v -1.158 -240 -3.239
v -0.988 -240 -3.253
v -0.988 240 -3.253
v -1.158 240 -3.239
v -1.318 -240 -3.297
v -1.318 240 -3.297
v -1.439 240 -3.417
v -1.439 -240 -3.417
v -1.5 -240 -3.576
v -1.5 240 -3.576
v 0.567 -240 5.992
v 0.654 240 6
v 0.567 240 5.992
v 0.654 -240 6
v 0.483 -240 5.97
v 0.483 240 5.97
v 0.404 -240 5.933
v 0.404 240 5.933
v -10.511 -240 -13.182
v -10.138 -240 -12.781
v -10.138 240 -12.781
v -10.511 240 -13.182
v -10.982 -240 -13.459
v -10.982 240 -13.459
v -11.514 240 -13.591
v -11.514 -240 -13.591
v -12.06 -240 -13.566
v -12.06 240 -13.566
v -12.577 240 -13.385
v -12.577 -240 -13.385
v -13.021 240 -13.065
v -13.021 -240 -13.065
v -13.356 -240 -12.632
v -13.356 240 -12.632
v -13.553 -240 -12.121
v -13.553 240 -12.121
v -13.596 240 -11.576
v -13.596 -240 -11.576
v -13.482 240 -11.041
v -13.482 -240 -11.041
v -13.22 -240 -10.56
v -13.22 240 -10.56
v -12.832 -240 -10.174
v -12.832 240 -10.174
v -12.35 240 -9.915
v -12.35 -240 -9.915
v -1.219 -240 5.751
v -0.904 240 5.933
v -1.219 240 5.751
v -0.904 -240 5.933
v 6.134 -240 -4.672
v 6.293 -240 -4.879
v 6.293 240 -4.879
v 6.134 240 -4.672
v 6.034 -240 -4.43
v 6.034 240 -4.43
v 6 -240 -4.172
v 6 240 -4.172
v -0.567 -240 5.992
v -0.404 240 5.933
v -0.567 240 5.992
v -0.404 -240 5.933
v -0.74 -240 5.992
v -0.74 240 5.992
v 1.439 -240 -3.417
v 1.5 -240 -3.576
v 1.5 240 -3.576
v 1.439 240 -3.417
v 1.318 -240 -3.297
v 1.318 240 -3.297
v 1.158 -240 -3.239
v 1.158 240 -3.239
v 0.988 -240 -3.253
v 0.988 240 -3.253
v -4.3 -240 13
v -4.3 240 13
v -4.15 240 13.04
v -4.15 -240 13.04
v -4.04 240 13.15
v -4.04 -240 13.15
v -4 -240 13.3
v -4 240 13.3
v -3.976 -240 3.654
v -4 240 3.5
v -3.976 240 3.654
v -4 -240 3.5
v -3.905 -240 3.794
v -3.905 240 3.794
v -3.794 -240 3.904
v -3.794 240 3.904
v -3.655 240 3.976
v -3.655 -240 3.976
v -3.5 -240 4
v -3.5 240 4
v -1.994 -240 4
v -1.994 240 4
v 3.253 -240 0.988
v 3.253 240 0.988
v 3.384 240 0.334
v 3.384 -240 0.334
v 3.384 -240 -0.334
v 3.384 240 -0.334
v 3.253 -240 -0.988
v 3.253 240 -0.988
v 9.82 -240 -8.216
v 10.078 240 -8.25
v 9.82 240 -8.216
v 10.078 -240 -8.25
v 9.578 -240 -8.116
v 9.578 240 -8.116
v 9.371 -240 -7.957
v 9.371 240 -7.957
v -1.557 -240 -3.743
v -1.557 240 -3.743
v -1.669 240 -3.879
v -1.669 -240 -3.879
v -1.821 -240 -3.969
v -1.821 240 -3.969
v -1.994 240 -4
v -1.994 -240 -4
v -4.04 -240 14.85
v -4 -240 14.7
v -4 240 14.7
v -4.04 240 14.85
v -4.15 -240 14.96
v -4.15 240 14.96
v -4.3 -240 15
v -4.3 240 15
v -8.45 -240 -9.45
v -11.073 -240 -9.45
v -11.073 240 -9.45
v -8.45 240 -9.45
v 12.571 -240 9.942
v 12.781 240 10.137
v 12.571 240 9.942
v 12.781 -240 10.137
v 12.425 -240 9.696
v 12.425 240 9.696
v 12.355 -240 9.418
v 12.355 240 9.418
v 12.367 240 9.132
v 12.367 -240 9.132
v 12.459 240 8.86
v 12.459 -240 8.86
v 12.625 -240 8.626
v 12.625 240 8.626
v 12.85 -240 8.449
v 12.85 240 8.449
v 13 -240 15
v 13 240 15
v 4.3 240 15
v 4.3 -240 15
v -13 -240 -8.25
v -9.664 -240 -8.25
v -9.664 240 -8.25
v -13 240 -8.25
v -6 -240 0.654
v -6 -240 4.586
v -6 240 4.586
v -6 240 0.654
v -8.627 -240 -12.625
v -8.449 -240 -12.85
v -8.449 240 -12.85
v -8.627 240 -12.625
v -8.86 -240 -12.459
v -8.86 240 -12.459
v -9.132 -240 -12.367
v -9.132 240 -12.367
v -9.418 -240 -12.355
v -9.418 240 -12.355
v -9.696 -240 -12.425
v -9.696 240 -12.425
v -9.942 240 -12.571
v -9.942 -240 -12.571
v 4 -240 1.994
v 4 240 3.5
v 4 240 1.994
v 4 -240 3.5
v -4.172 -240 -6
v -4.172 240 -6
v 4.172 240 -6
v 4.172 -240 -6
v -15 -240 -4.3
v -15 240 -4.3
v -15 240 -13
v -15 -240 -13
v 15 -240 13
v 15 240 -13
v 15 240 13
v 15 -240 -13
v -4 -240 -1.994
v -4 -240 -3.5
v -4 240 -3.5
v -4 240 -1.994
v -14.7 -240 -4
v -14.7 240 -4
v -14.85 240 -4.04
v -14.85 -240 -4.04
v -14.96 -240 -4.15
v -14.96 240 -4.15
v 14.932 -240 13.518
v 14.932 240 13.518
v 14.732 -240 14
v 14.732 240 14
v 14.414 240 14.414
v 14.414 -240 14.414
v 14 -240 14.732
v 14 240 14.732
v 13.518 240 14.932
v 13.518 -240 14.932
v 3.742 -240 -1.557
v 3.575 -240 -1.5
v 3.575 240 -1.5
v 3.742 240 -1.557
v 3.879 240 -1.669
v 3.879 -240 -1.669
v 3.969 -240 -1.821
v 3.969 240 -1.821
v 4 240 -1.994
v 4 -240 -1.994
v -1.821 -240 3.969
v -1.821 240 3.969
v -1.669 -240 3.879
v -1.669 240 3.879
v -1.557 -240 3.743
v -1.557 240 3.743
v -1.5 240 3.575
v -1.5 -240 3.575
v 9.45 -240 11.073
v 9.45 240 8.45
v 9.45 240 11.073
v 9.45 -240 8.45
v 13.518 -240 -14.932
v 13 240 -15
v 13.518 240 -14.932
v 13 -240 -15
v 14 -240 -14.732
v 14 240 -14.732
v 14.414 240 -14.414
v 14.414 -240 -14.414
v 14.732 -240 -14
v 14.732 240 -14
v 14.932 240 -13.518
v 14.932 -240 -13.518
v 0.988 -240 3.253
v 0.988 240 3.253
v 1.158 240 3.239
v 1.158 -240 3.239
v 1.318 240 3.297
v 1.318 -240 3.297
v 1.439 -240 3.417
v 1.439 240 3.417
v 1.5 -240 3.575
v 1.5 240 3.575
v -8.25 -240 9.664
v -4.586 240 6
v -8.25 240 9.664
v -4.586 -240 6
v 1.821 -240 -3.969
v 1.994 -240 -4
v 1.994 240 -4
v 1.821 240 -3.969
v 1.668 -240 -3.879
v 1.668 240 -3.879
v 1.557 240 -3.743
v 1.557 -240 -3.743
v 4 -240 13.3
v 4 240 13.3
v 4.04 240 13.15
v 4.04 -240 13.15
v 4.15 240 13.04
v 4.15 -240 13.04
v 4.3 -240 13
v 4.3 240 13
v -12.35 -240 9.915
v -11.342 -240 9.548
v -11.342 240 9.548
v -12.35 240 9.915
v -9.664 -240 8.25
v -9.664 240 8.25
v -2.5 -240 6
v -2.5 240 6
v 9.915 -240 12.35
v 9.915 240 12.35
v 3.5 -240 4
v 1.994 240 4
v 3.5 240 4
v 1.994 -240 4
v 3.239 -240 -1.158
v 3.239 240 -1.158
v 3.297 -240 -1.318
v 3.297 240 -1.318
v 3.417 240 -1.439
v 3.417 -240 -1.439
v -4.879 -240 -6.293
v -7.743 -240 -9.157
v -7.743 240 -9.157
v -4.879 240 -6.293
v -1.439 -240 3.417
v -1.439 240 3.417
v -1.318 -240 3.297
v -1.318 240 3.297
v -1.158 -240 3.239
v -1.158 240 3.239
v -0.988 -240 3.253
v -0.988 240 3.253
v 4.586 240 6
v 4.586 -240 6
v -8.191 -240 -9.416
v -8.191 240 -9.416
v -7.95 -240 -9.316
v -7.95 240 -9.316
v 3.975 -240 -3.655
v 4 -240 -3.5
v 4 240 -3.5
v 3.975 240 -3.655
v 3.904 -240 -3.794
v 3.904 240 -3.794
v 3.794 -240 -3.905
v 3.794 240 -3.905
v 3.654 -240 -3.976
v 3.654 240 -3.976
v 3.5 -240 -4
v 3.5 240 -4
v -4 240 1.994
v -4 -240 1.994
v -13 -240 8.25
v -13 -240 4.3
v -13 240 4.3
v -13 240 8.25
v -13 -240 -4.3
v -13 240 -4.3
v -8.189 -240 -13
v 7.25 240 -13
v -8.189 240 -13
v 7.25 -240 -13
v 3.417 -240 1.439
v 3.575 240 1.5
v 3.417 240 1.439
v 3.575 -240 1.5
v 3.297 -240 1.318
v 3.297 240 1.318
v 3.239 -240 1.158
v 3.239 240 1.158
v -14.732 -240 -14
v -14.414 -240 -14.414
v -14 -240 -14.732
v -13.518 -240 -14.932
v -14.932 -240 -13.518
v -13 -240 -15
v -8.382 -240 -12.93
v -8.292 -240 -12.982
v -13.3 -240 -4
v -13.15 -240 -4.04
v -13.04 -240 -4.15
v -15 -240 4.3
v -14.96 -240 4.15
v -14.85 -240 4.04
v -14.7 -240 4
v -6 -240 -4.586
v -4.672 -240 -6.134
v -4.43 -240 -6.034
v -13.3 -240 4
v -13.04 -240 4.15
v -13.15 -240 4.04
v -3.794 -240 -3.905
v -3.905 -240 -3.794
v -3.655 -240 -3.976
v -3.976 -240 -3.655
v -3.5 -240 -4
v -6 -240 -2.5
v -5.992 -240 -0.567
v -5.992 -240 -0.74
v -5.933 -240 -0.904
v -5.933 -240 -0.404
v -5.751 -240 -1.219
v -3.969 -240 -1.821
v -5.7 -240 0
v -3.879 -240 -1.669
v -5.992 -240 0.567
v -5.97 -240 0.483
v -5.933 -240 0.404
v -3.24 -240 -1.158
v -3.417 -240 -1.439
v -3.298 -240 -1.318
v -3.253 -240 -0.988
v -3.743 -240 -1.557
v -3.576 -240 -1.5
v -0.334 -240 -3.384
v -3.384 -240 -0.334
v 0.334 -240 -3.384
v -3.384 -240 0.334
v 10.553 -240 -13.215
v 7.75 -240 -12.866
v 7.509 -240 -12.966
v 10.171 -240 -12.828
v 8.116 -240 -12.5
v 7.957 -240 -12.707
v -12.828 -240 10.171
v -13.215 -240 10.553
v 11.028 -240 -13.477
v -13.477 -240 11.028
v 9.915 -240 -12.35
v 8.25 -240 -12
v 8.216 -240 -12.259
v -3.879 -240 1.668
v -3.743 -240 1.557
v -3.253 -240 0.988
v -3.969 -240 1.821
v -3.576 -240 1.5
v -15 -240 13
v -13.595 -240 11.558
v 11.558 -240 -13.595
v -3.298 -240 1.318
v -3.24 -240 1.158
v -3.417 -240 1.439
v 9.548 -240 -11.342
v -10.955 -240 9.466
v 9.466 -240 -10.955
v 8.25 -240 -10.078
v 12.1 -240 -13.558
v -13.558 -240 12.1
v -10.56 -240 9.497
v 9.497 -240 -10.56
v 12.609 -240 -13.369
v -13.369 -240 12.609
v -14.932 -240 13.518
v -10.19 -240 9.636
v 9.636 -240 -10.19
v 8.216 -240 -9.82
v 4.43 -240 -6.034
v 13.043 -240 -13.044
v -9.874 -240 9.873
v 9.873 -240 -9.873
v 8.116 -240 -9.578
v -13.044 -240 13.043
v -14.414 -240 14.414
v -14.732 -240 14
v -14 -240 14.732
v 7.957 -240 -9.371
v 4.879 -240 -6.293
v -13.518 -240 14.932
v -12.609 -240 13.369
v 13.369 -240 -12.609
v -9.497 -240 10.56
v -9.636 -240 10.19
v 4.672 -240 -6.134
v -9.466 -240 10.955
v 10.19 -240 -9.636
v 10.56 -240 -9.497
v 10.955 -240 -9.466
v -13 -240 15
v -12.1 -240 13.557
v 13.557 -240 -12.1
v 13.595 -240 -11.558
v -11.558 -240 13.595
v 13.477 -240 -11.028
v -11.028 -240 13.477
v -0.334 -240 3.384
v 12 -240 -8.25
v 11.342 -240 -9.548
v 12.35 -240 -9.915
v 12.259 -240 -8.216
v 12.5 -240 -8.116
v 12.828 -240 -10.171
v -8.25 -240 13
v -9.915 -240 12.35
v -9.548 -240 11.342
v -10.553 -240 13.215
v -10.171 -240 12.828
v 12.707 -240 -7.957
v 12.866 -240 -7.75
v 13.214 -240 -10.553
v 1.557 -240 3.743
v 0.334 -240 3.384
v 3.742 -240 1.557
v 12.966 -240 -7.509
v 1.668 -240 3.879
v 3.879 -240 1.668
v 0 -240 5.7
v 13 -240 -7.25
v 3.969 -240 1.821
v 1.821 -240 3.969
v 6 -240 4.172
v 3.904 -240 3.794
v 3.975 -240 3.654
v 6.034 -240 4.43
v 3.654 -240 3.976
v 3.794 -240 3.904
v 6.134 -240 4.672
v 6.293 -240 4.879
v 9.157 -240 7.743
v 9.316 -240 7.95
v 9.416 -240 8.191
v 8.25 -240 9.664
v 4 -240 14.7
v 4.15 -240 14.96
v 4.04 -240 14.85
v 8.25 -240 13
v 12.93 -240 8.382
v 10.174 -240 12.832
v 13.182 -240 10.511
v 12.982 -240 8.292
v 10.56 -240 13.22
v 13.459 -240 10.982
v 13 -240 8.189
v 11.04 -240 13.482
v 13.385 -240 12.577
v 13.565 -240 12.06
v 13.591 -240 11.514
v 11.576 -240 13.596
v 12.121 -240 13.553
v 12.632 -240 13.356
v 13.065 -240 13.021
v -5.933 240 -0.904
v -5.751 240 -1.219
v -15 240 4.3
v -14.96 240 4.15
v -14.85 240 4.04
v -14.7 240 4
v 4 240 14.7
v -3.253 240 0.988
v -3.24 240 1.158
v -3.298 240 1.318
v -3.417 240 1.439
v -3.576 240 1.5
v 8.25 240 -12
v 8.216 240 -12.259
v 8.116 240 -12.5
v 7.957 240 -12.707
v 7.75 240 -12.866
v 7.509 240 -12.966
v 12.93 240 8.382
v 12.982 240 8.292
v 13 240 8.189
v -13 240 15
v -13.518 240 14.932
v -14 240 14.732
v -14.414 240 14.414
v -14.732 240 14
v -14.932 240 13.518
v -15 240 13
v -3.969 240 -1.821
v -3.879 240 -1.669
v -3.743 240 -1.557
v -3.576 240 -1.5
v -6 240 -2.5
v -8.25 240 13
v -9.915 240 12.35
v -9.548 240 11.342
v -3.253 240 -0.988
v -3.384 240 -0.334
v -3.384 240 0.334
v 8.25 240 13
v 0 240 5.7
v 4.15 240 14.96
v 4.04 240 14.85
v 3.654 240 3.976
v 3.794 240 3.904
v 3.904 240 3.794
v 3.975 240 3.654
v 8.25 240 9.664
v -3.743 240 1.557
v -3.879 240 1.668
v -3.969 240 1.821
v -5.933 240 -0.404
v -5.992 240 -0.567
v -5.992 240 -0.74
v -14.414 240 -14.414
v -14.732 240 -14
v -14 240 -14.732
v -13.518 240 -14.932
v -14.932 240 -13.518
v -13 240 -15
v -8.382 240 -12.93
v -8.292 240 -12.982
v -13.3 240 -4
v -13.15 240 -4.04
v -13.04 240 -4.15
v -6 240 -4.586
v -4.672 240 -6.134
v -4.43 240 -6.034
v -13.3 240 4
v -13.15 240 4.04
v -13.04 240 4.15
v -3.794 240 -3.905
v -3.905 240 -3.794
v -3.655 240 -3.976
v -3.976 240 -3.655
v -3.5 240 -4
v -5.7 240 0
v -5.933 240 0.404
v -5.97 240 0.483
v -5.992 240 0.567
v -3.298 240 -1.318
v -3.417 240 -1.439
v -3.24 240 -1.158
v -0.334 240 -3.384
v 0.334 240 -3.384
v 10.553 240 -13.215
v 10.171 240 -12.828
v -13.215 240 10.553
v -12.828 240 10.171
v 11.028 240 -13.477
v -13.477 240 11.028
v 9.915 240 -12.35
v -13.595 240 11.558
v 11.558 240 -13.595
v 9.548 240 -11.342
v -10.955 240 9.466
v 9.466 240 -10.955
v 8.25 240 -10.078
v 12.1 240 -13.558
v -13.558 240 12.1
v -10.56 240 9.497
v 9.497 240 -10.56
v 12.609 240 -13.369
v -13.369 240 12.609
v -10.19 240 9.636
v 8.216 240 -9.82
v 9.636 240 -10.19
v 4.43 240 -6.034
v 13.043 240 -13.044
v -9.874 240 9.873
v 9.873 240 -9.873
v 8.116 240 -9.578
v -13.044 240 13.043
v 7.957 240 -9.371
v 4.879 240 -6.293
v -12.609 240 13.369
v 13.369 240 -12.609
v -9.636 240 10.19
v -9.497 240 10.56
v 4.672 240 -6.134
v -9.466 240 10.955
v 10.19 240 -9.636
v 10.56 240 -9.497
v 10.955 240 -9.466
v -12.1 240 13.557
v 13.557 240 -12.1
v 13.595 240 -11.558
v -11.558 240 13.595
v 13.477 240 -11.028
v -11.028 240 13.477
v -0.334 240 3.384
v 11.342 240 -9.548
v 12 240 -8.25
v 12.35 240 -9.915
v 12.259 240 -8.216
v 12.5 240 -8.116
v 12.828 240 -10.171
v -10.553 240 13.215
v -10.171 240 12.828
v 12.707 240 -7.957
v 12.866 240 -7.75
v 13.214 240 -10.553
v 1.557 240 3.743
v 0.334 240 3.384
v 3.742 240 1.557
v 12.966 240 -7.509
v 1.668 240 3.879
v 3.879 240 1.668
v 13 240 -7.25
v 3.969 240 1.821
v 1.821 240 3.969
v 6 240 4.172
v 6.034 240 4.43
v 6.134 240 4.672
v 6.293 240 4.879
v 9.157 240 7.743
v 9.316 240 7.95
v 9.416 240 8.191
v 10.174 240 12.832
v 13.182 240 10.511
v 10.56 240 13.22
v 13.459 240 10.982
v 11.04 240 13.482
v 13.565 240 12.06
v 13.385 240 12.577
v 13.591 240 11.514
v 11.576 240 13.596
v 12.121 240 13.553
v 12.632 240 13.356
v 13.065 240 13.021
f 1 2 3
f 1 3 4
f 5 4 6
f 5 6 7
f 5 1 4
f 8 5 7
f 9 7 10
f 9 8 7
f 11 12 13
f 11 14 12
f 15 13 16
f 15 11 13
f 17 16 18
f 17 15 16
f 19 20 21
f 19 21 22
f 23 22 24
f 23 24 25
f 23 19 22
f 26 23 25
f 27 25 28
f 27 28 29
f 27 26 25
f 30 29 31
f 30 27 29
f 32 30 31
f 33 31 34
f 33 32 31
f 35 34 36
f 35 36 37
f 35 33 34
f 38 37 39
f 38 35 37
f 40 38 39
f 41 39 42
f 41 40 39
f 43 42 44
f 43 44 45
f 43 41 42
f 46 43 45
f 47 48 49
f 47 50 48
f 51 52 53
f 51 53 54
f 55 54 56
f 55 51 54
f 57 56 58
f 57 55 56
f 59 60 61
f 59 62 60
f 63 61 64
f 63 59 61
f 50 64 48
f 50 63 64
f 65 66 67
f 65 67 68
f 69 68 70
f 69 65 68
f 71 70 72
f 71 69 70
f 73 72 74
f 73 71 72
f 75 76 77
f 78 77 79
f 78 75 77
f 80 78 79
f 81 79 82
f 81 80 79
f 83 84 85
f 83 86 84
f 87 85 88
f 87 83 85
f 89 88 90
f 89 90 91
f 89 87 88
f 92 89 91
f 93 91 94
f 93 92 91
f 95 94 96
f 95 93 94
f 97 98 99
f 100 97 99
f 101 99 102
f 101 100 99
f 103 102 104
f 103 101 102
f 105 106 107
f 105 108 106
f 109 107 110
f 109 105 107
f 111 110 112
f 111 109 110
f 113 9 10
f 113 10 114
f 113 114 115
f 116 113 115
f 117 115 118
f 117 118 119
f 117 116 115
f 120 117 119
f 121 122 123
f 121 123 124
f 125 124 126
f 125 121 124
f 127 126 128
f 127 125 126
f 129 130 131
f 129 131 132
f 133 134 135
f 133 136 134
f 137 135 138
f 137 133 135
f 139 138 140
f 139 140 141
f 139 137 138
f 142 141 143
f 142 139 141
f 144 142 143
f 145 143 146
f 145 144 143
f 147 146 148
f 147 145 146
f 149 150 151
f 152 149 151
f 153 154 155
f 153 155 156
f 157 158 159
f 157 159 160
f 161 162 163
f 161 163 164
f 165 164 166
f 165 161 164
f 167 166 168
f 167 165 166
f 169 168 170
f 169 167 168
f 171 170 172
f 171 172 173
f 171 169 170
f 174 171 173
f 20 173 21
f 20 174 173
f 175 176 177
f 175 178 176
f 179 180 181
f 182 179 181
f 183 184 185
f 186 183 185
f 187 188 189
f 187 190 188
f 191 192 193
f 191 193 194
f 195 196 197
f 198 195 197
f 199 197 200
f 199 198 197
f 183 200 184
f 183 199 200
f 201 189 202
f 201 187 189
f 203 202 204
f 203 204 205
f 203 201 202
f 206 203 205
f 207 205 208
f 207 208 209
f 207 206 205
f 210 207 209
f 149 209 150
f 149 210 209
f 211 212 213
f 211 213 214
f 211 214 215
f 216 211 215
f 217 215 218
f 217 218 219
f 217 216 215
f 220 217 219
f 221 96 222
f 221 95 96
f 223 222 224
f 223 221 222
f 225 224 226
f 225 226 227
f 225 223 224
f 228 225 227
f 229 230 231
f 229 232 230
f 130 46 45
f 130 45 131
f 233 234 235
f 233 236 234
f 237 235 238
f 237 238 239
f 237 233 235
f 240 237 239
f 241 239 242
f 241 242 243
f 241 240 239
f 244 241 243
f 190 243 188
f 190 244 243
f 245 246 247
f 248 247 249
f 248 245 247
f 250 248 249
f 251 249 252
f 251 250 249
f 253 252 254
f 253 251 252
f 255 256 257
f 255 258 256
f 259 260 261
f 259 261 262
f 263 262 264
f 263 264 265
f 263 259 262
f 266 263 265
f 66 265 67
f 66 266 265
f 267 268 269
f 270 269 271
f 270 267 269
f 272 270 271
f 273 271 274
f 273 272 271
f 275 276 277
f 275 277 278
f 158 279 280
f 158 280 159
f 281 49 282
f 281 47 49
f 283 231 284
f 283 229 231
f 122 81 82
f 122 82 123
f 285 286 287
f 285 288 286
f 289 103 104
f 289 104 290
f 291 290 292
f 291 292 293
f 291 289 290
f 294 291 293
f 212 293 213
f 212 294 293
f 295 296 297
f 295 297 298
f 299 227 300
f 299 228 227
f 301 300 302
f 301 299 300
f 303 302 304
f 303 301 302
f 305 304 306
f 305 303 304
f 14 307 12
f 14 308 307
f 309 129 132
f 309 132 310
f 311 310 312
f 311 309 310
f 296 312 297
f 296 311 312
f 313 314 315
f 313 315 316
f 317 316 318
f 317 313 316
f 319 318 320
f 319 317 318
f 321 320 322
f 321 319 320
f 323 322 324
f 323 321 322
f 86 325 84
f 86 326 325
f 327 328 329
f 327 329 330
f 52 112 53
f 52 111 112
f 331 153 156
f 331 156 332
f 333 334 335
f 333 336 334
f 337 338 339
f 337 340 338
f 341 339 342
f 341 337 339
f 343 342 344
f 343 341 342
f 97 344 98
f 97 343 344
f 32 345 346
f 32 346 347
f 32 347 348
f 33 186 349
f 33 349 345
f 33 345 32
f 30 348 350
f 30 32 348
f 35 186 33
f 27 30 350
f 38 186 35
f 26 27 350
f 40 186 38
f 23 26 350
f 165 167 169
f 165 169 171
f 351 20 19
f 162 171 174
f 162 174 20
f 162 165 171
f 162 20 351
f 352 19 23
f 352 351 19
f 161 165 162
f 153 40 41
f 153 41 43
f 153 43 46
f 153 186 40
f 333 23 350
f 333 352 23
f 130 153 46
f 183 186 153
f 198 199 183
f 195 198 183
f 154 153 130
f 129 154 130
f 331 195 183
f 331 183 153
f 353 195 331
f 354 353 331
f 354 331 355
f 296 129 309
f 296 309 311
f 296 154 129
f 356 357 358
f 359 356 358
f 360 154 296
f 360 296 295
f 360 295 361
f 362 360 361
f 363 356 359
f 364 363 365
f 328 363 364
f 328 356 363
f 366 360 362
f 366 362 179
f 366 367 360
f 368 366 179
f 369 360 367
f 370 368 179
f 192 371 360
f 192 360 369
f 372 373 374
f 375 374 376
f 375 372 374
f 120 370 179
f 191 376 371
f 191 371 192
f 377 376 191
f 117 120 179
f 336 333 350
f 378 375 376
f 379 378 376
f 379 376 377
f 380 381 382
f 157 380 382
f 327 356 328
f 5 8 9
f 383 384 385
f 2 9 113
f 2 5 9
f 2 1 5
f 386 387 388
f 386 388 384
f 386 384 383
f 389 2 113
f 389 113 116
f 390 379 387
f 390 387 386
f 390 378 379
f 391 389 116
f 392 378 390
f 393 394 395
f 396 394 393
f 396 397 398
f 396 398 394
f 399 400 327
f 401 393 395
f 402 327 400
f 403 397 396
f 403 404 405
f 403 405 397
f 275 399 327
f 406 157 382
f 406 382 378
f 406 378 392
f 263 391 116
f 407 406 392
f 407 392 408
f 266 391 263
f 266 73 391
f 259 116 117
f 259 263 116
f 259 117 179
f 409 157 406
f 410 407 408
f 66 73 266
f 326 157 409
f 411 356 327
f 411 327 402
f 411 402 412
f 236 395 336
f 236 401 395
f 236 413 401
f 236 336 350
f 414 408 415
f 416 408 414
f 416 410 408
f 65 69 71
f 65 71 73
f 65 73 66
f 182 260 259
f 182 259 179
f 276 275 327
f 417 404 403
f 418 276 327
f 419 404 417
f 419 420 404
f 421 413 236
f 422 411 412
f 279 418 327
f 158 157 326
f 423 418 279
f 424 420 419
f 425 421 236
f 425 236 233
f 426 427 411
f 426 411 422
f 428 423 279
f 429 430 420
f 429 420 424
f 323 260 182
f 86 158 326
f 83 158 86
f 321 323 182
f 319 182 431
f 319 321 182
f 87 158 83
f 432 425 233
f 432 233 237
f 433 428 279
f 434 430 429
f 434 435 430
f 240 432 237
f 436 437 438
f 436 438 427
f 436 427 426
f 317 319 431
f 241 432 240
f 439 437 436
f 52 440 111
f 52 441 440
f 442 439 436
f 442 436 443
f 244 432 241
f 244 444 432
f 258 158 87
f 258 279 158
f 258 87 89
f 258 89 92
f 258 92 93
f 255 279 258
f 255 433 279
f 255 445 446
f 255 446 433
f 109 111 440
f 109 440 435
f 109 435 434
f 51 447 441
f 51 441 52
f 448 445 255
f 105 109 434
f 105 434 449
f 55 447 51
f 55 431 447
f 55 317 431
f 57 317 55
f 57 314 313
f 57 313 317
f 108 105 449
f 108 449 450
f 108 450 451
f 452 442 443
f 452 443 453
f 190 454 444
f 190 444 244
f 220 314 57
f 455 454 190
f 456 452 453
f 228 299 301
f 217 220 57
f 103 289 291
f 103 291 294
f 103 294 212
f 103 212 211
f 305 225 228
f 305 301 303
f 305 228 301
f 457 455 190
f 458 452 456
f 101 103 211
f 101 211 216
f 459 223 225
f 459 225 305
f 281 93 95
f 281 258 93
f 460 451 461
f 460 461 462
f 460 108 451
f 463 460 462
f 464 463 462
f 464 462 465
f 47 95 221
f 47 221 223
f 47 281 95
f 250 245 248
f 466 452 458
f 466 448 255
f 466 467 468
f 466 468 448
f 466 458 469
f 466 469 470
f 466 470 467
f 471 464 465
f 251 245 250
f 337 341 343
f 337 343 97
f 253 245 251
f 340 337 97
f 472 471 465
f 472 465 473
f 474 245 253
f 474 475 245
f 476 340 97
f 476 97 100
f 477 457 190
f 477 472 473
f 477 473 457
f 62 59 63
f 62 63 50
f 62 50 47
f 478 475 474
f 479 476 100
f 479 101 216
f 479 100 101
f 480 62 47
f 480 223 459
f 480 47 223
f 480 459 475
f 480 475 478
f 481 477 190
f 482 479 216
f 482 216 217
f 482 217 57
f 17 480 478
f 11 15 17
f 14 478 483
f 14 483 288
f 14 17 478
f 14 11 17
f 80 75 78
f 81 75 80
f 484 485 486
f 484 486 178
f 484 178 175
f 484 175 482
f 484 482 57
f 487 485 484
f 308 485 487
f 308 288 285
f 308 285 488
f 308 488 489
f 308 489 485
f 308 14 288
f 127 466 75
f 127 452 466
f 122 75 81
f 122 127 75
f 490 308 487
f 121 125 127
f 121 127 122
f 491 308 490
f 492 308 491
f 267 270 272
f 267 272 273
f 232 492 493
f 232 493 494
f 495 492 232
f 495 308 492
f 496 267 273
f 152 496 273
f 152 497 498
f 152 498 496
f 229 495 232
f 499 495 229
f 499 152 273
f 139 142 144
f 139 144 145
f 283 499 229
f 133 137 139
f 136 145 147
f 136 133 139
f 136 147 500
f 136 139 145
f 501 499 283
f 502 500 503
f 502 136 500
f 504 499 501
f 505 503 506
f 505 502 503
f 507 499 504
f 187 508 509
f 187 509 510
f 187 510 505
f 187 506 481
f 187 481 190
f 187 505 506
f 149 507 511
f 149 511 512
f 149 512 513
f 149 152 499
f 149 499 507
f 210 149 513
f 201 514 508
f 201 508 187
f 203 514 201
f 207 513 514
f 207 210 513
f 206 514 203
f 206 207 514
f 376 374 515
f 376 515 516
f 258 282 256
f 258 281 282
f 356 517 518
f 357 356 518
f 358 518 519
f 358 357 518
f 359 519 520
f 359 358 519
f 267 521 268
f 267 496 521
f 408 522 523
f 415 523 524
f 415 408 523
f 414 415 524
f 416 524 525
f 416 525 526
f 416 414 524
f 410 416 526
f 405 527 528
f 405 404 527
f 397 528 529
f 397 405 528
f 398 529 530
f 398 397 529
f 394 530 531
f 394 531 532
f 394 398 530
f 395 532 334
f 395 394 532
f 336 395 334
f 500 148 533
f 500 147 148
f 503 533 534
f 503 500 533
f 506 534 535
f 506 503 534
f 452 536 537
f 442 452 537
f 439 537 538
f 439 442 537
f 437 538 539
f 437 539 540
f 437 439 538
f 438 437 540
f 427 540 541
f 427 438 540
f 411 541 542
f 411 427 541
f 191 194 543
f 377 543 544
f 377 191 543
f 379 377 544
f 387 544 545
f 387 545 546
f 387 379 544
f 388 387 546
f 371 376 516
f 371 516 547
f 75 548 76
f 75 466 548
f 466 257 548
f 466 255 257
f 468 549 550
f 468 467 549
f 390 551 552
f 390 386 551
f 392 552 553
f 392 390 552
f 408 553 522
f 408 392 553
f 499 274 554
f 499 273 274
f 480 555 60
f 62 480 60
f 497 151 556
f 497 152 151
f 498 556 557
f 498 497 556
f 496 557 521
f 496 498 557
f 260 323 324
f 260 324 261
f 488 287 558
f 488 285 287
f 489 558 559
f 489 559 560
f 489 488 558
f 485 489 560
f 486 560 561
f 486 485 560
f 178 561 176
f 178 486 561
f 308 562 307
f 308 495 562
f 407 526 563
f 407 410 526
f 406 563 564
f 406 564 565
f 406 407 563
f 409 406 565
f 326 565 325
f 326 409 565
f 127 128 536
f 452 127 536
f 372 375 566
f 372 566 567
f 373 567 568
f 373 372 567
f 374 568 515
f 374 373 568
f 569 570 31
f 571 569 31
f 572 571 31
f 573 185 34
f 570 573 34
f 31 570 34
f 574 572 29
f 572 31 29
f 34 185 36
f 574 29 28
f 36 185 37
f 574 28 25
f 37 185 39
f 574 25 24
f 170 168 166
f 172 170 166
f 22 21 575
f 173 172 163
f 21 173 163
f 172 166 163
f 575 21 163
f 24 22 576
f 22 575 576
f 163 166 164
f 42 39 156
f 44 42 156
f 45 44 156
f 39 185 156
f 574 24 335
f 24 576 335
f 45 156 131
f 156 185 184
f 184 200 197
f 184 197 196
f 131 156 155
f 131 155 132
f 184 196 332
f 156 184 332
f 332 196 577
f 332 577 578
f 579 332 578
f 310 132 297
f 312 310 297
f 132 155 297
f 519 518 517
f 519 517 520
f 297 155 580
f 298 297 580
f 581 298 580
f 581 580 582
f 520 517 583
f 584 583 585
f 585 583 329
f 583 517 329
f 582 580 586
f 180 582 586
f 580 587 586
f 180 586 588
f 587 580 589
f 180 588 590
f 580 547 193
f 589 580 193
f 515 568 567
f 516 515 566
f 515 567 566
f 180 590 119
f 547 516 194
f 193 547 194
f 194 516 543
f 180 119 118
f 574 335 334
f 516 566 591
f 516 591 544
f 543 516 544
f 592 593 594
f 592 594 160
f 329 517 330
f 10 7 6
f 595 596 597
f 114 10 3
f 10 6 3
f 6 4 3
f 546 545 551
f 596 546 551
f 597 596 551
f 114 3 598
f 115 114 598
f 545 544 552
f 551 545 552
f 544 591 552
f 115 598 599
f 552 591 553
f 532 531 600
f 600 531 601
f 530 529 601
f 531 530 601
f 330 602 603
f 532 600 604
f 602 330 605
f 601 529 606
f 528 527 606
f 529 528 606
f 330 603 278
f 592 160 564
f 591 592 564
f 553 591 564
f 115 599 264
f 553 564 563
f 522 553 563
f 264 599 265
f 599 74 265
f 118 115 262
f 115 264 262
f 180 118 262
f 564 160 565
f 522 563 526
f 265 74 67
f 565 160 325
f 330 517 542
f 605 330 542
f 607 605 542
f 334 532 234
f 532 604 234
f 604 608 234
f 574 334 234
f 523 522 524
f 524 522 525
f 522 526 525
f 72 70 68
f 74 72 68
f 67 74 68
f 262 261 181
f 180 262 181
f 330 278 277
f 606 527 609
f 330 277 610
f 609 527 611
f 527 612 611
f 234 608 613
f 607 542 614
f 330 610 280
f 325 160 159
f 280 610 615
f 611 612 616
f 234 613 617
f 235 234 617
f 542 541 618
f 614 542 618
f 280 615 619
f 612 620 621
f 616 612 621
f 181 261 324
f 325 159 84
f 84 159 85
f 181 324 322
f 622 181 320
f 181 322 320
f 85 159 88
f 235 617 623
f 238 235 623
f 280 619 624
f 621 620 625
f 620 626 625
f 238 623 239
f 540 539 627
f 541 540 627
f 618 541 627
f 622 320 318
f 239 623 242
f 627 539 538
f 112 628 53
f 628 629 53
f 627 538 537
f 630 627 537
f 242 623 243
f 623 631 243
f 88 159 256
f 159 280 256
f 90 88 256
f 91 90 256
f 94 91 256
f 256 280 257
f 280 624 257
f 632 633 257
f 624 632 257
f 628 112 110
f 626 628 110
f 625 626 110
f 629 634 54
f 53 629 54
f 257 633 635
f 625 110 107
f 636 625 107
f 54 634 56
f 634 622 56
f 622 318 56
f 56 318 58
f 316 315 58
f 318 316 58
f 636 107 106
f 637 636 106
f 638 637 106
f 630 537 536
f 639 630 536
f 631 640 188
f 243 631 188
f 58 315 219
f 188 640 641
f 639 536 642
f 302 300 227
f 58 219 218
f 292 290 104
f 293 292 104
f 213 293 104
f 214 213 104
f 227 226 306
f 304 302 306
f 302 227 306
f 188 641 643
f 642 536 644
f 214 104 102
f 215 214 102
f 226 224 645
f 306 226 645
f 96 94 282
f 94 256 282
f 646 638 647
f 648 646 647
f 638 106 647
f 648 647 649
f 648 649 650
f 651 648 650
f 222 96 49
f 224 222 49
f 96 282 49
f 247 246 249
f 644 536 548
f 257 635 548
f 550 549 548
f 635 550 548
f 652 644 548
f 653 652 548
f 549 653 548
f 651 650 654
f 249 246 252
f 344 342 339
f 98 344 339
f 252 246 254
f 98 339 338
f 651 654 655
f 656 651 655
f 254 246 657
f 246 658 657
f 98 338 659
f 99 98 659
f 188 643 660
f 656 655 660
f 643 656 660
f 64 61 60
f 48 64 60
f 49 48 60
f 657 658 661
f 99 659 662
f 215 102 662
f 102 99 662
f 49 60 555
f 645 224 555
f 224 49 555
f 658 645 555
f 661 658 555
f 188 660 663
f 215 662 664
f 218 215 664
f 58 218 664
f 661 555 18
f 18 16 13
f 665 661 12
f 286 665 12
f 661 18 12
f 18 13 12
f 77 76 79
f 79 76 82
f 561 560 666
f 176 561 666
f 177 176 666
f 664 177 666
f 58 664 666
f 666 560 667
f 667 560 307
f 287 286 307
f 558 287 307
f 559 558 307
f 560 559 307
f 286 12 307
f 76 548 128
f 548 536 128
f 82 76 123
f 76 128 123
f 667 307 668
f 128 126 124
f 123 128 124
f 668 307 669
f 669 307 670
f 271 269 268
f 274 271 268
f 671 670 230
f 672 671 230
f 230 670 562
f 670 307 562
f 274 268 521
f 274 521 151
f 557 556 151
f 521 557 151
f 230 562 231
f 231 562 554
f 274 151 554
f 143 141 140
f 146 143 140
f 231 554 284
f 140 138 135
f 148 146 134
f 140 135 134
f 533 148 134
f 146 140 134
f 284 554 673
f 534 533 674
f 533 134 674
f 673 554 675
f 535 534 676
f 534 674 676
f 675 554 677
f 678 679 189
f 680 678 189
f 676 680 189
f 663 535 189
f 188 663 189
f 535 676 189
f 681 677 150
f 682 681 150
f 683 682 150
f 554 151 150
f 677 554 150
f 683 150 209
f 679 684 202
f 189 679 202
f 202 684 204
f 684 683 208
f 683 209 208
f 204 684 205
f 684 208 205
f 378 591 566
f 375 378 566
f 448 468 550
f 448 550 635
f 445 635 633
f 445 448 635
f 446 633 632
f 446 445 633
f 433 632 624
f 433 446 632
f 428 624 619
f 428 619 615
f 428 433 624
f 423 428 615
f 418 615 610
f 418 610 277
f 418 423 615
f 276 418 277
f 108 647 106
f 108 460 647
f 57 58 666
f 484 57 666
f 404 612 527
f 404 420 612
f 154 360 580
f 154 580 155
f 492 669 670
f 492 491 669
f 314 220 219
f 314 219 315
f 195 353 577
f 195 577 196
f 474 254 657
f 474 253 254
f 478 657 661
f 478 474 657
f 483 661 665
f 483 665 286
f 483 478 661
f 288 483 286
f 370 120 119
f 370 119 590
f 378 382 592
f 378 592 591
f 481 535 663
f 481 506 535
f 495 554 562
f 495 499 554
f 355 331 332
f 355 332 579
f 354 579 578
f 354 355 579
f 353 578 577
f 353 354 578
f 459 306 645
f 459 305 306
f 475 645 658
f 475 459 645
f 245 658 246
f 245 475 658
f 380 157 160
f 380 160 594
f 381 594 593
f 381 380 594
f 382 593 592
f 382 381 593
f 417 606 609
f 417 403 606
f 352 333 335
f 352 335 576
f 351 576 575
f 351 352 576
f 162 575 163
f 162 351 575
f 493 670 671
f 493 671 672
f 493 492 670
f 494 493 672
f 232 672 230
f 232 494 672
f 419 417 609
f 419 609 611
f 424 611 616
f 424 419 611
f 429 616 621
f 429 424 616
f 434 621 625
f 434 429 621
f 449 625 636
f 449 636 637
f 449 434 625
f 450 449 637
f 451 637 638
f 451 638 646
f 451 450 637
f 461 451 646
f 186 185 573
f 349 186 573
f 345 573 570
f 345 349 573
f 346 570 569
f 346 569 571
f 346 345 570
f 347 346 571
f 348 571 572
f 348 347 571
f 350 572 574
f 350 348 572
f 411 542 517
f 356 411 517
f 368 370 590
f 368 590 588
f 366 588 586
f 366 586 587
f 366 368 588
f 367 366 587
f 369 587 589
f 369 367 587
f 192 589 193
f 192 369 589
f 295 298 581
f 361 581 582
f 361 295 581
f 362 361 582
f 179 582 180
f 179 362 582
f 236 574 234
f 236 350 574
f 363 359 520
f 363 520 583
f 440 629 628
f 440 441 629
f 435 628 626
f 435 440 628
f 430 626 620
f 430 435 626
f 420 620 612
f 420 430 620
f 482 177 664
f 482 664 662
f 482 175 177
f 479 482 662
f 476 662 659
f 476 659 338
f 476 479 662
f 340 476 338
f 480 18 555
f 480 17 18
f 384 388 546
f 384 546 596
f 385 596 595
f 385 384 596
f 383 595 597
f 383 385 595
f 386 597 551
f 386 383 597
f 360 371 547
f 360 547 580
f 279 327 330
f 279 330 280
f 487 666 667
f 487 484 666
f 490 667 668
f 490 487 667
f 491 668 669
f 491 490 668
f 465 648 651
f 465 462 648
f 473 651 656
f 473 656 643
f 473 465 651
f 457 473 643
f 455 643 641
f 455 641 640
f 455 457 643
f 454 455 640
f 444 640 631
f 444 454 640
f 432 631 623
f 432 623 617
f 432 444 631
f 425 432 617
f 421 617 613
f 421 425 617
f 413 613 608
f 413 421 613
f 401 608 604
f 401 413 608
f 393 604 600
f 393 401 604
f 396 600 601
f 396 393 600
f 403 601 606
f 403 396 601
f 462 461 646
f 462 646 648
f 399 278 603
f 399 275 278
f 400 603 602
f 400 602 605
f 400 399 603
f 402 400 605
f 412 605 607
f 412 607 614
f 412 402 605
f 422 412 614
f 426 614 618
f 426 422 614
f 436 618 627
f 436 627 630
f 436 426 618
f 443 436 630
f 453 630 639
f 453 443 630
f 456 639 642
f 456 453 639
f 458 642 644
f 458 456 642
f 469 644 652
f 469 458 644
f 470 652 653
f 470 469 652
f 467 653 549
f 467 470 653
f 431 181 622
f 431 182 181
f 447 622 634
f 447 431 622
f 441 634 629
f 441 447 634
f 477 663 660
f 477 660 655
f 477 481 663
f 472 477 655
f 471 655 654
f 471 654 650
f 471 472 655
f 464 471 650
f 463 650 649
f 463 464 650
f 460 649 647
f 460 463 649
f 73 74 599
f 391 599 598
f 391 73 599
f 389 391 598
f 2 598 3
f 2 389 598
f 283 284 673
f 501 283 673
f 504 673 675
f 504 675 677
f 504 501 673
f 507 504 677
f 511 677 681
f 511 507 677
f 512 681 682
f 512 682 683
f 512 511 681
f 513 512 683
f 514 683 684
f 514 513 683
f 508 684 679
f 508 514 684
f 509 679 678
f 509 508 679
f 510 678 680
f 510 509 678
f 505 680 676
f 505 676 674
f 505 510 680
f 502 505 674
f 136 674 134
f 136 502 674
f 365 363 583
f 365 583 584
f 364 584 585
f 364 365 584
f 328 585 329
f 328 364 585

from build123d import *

# Parameters (mm, degrees)
F2_DEPTH = 240


# Not quite as in the source:
# - ends of sketch curves that miss each other by under 0.0002 mm in the source are joined


with BuildPart() as f2:
    # F1 (on Front) → F2 (new body, symmetric)
    with BuildSketch(Plane.XZ):
        with BuildLine():
            Line((-8.250056, 12.999986), (-4.300056, 12.999986))
            ThreePointArc((-4.300056, 12.999986), (-4.0879239656, 13.0878539656), (-4.000056, 13.299986))
            Line((-4.000056, 13.299986), (-4.000056, 14.699986))
            ThreePointArc((-4.000056, 14.699986), (-4.0879239656, 14.9121180344), (-4.300056, 14.999986))
            Line((-4.300056, 14.999986), (-13.000056, 14.999986))
            ThreePointArc((-13.000056, 14.999986), (-14.4142695624, 14.4141995624), (-15.000056, 12.999986))
            Line((-15.000056, 12.999986), (-15.000056, 4.299986))
            ThreePointArc((-15.000056, 4.299986), (-14.9121880344, 4.0878539656), (-14.700056, 3.999986))
            Line((-14.700056, 3.999986), (-13.300056, 3.999986))
            ThreePointArc((-13.300056, 3.999986), (-13.0879239656, 4.0878539656), (-13.000056, 4.299986))
            Line((-13.000056, 4.299986), (-13.000056, 8.249986))
            Line((-13.000056, 8.249986), (-9.66427, 8.249986))
            Line((-9.66427, 8.249986), (-6.000056, 4.585772))
            Line((-6.000056, 4.585772), (-6.000056, 0.653576))
            ThreePointArc((-6.000056, 0.653576), (-5.9830189324, 0.5241665494), (-5.9330687764, 0.4035761291))
            Line((-5.9330687764, 0.4035761291), (-5.700056, -1.4e-05))
            Line((-5.700056, -1.4e-05), (-5.933069, -0.403604))
            ThreePointArc((-5.933069, -0.403604), (-6.000056, -0.653604), (-5.9330687764, -0.9036038709))
            Line((-5.9330687764, -0.9036038709), (-5.751033, -1.2189))
            Line((-5.751033, -1.2189), (-6.000056, -2.500014))
            Line((-6.000056, -2.500014), (-6.000056, -4.5858))
            Line((-6.000056, -4.5858), (-9.66427, -8.250014))
            Line((-9.66427, -8.250014), (-13.000056, -8.250014))
            Line((-13.000056, -8.250014), (-13.000056, -4.300014))
            ThreePointArc((-13.000056, -4.300014), (-13.0879239656, -4.0878819656), (-13.300056, -4.000014))
            Line((-13.300056, -4.000014), (-14.700056, -4.000014))
            ThreePointArc((-14.700056, -4.000014), (-14.9121880344, -4.0878819656), (-15.000056, -4.300014))
            Line((-15.000056, -4.300014), (-15.000056, -13.000014))
            ThreePointArc((-15.000056, -13.000014), (-14.4142695624, -14.4142275624), (-13.000056, -15.000014))
            Line((-13.000056, -15.000014), (12.999944, -15.000014))
            ThreePointArc((12.999944, -15.000014), (14.4141575624, -14.4142275624), (14.999944, -13.000014))
            Line((14.999944, -13.000014), (14.999944, 12.999986))
            ThreePointArc((14.999944, 12.999986), (14.4141575624, 14.4141995624), (12.999944, 14.999986))
            Line((12.999944, 14.999986), (4.299944, 14.999986))
            ThreePointArc((4.299944, 14.999986), (4.0878119656, 14.9121180344), (3.999944, 14.699986))
            Line((3.999944, 14.699986), (3.999944, 13.299986))
            ThreePointArc((3.999944, 13.299986), (4.0878119656, 13.0878539656), (4.299944, 12.999986))
            Line((4.299944, 12.999986), (8.249944, 12.999986))
            Line((8.249944, 12.999986), (8.249944, 9.6642))
            Line((8.249944, 9.6642), (4.58573, 5.999986))
            Line((4.58573, 5.999986), (0.653534, 5.999986))
            ThreePointArc((0.653534, 5.999986), (0.5241245494, 5.9829489324), (0.4035341291, 5.9329987764))
            Line((0.4035341291, 5.9329987764), (-5.6e-05, 5.699986))
            Line((-5.6e-05, 5.699986), (-0.403646, 5.932999))
            ThreePointArc((-0.403646, 5.932999), (-0.653646, 5.999986), (-0.9036458709, 5.9329987764))
            Line((-0.9036458709, 5.9329987764), (-1.218942, 5.750963))
            Line((-1.218942, 5.750963), (-2.500056, 5.999986))
            Line((-2.500056, 5.999986), (-4.585842, 5.999986))
            Line((-4.585842, 5.999986), (-8.250056, 9.6642))
            Line((-8.250056, 9.6642), (-8.250056, 12.999986))
        make_face()
        with BuildLine():
            ThreePointArc((-8.189375, -13.000014), (-8.339375082, -12.9598215738), (-8.4491827159, -12.8500138359))
            ThreePointArc((-8.4491827159, -12.8500138359), (-9.2743948384, -12.3508472042), (-10.1375690315, -12.7810479782))
            ThreePointArc((-10.1375690315, -12.7810479782), (-13.2041723505, -12.8608903949), (-12.3498940253, -9.9145979306))
            Line((-12.3498940253, -9.9145979306), (-11.07346, -9.450014))
            Line((-11.07346, -9.450014), (-8.450056, -9.450014))
            ThreePointArc((-8.450056, -9.450014), (-8.0673725676, -9.3738935325), (-7.7429492188, -9.1571207812))
            Line((-7.7429492188, -9.1571207812), (-4.878736, -6.292907))
            ThreePointArc((-4.878736, -6.292907), (-4.5543124324, -6.0761344675), (-4.171629, -6.000014))
            Line((-4.171629, -6.000014), (4.171517, -6.000014))
            ThreePointArc((4.171517, -6.000014), (4.5542004324, -6.0761344675), (4.8786237812, -6.2929072188))
            Line((4.8786237812, -6.2929072188), (7.957051, -9.371334))
            ThreePointArc((7.957051, -9.371334), (8.1738235325, -9.6957575676), (8.249944, -10.078441))
            Line((8.249944, -10.078441), (8.249944, -12.000014))
            ThreePointArc((8.249944, -12.000014), (7.9570507812, -12.7071207812), (7.249944, -13.000014))
            Line((7.249944, -13.000014), (-8.189375, -13.000014))
        make_face(mode=Mode.SUBTRACT)
        with BuildLine():
            ThreePointArc((9.5477956661, -11.3422641215), (9.8734155063, -9.8734855063), (11.3421941215, -9.5478656661))
            Line((11.3421941215, -9.5478656661), (12.349782, -9.914598))
            ThreePointArc((12.349782, -9.914598), (13.0434468843, -13.0435168843), (9.9145279306, -12.3498520253))
            Line((9.9145279306, -12.3498520253), (9.5477956661, -11.3422641215))
        make_face(mode=Mode.SUBTRACT)
        with BuildLine():
            ThreePointArc((-9.5479076661, 11.3422361215), (-9.8735275063, 9.8734575063), (-11.3423061215, 9.5478376661))
            Line((-11.3423061215, 9.5478376661), (-12.349894, 9.91457))
            ThreePointArc((-12.349894, 9.91457), (-13.0435588843, 13.0434888843), (-9.9146399306, 12.3498240253))
            Line((-9.9146399306, 12.3498240253), (-9.5479076661, 11.3422361215))
        make_face(mode=Mode.SUBTRACT)
        with BuildLine():
            ThreePointArc((3.2531309855, 0.9883049956), (3.399944, -1.4e-05), (3.2531309855, -0.9883329956))
            ThreePointArc((3.2531309855, -0.9883329956), (3.2974111593, -1.3177976431), (3.5754529349, -1.5000144258))
            ThreePointArc((3.5754529349, -1.5000144258), (3.8792555231, -1.6685151025), (3.999944, -1.99428))
            Line((3.999944, -1.99428), (3.999944, -3.500014))
            ThreePointArc((3.999944, -3.500014), (3.8534973906, -3.8535673906), (3.499944, -4.000014))
            Line((3.499944, -4.000014), (1.99421, -4.000014))
            ThreePointArc((1.99421, -4.000014), (1.6684451025, -3.8793255231), (1.4999444822, -3.5755229263))
            ThreePointArc((1.4999444822, -3.5755229263), (1.3177276431, -3.2974811593), (0.9882590481, -3.2532021585))
            ThreePointArc((0.9882590481, -3.2532021585), (-5.6e-05, -3.400014), (-0.9883749956, -3.2532009855))
            ThreePointArc((-0.9883749956, -3.2532009855), (-1.3178396431, -3.2974811593), (-1.5000564258, -3.5755229349))
            ThreePointArc((-1.5000564258, -3.5755229349), (-1.6685571025, -3.8793255231), (-1.994322, -4.000014))
            Line((-1.994322, -4.000014), (-3.500056, -4.000014))
            ThreePointArc((-3.500056, -4.000014), (-3.8536093906, -3.8535673906), (-4.000056, -3.500014))
            Line((-4.000056, -3.500014), (-4.000056, -1.99428))
            ThreePointArc((-4.000056, -1.99428), (-3.8793675231, -1.6685151025), (-3.5755649263, -1.5000144822))
            ThreePointArc((-3.5755649263, -1.5000144822), (-3.2975231593, -1.3177976431), (-3.2532441585, -0.9883290481))
            ThreePointArc((-3.2532441585, -0.9883290481), (-3.400056, -1.4e-05), (-3.2532429855, 0.9883049956))
            ThreePointArc((-3.2532429855, 0.9883049956), (-3.2975231593, 1.3177696431), (-3.5755649349, 1.4999864258))
            ThreePointArc((-3.5755649349, 1.4999864258), (-3.8793675231, 1.6684871025), (-4.000056, 1.994252))
            Line((-4.000056, 1.994252), (-4.000056, 3.499986))
            ThreePointArc((-4.000056, 3.499986), (-3.8536093906, 3.8535393906), (-3.500056, 3.999986))
            Line((-3.500056, 3.999986), (-1.994322, 3.999986))
            ThreePointArc((-1.994322, 3.999986), (-1.6685571025, 3.8792975231), (-1.5000564822, 3.5754949263))
            ThreePointArc((-1.5000564822, 3.5754949263), (-1.3178396431, 3.2974531593), (-0.9883710481, 3.2531741585))
            ThreePointArc((-0.9883710481, 3.2531741585), (-5.6e-05, 3.399986), (0.9882629956, 3.2531729855))
            ThreePointArc((0.9882629956, 3.2531729855), (1.3177276431, 3.2974531593), (1.4999444258, 3.5754949349))
            ThreePointArc((1.4999444258, 3.5754949349), (1.6684451025, 3.8792975231), (1.99421, 3.999986))
            Line((1.99421, 3.999986), (3.499944, 3.999986))
            ThreePointArc((3.499944, 3.999986), (3.8534973906, 3.8535393906), (3.999944, 3.499986))
            Line((3.999944, 3.499986), (3.999944, 1.994252))
            ThreePointArc((3.999944, 1.994252), (3.8792555231, 1.6684871025), (3.5754529263, 1.4999864822))
            ThreePointArc((3.5754529263, 1.4999864822), (3.2974111593, 1.3177696431), (3.2531309855, 0.9883049956))
        make_face(mode=Mode.SUBTRACT)
        with BuildLine():
            ThreePointArc((6.2928372188, -4.8786937812), (6.0760644675, -4.5542704324), (5.999944, -4.171587))
            Line((5.999944, -4.171587), (5.999944, 4.171559))
            ThreePointArc((5.999944, 4.171559), (6.0760644675, 4.5542424324), (6.2928372188, 4.8786657812))
            Line((6.2928372188, 4.8786657812), (9.157051, 7.742879))
            ThreePointArc((9.157051, 7.742879), (9.3738235325, 8.0673025676), (9.449944, 8.449986))
            Line((9.449944, 8.449986), (9.449944, 11.07339))
            Line((9.449944, 11.07339), (9.914528, 12.349824))
            ThreePointArc((9.914528, 12.349824), (12.8608203949, 13.2041023505), (12.7809779799, 10.1374990291))
            ThreePointArc((12.7809779799, 10.1374990291), (12.3507772042, 9.2743248384), (12.8499438252, 8.4491126972))
            ThreePointArc((12.8499438252, 8.4491126972), (12.9597515738, 8.339305082), (12.999944, 8.189305))
            Line((12.999944, 8.189305), (12.999944, -7.250014))
            ThreePointArc((12.999944, -7.250014), (12.7070507812, -7.9571207812), (11.999944, -8.250014))
            Line((11.999944, -8.250014), (10.078371, -8.250014))
            ThreePointArc((10.078371, -8.250014), (9.6956875676, -8.1738935325), (9.3712642188, -7.9571207812))
            Line((9.3712642188, -7.9571207812), (6.2928372188, -4.8786937812))
        make_face(mode=Mode.SUBTRACT)
    extrude(amount=F2_DEPTH, both=True)


solid = f2.part
